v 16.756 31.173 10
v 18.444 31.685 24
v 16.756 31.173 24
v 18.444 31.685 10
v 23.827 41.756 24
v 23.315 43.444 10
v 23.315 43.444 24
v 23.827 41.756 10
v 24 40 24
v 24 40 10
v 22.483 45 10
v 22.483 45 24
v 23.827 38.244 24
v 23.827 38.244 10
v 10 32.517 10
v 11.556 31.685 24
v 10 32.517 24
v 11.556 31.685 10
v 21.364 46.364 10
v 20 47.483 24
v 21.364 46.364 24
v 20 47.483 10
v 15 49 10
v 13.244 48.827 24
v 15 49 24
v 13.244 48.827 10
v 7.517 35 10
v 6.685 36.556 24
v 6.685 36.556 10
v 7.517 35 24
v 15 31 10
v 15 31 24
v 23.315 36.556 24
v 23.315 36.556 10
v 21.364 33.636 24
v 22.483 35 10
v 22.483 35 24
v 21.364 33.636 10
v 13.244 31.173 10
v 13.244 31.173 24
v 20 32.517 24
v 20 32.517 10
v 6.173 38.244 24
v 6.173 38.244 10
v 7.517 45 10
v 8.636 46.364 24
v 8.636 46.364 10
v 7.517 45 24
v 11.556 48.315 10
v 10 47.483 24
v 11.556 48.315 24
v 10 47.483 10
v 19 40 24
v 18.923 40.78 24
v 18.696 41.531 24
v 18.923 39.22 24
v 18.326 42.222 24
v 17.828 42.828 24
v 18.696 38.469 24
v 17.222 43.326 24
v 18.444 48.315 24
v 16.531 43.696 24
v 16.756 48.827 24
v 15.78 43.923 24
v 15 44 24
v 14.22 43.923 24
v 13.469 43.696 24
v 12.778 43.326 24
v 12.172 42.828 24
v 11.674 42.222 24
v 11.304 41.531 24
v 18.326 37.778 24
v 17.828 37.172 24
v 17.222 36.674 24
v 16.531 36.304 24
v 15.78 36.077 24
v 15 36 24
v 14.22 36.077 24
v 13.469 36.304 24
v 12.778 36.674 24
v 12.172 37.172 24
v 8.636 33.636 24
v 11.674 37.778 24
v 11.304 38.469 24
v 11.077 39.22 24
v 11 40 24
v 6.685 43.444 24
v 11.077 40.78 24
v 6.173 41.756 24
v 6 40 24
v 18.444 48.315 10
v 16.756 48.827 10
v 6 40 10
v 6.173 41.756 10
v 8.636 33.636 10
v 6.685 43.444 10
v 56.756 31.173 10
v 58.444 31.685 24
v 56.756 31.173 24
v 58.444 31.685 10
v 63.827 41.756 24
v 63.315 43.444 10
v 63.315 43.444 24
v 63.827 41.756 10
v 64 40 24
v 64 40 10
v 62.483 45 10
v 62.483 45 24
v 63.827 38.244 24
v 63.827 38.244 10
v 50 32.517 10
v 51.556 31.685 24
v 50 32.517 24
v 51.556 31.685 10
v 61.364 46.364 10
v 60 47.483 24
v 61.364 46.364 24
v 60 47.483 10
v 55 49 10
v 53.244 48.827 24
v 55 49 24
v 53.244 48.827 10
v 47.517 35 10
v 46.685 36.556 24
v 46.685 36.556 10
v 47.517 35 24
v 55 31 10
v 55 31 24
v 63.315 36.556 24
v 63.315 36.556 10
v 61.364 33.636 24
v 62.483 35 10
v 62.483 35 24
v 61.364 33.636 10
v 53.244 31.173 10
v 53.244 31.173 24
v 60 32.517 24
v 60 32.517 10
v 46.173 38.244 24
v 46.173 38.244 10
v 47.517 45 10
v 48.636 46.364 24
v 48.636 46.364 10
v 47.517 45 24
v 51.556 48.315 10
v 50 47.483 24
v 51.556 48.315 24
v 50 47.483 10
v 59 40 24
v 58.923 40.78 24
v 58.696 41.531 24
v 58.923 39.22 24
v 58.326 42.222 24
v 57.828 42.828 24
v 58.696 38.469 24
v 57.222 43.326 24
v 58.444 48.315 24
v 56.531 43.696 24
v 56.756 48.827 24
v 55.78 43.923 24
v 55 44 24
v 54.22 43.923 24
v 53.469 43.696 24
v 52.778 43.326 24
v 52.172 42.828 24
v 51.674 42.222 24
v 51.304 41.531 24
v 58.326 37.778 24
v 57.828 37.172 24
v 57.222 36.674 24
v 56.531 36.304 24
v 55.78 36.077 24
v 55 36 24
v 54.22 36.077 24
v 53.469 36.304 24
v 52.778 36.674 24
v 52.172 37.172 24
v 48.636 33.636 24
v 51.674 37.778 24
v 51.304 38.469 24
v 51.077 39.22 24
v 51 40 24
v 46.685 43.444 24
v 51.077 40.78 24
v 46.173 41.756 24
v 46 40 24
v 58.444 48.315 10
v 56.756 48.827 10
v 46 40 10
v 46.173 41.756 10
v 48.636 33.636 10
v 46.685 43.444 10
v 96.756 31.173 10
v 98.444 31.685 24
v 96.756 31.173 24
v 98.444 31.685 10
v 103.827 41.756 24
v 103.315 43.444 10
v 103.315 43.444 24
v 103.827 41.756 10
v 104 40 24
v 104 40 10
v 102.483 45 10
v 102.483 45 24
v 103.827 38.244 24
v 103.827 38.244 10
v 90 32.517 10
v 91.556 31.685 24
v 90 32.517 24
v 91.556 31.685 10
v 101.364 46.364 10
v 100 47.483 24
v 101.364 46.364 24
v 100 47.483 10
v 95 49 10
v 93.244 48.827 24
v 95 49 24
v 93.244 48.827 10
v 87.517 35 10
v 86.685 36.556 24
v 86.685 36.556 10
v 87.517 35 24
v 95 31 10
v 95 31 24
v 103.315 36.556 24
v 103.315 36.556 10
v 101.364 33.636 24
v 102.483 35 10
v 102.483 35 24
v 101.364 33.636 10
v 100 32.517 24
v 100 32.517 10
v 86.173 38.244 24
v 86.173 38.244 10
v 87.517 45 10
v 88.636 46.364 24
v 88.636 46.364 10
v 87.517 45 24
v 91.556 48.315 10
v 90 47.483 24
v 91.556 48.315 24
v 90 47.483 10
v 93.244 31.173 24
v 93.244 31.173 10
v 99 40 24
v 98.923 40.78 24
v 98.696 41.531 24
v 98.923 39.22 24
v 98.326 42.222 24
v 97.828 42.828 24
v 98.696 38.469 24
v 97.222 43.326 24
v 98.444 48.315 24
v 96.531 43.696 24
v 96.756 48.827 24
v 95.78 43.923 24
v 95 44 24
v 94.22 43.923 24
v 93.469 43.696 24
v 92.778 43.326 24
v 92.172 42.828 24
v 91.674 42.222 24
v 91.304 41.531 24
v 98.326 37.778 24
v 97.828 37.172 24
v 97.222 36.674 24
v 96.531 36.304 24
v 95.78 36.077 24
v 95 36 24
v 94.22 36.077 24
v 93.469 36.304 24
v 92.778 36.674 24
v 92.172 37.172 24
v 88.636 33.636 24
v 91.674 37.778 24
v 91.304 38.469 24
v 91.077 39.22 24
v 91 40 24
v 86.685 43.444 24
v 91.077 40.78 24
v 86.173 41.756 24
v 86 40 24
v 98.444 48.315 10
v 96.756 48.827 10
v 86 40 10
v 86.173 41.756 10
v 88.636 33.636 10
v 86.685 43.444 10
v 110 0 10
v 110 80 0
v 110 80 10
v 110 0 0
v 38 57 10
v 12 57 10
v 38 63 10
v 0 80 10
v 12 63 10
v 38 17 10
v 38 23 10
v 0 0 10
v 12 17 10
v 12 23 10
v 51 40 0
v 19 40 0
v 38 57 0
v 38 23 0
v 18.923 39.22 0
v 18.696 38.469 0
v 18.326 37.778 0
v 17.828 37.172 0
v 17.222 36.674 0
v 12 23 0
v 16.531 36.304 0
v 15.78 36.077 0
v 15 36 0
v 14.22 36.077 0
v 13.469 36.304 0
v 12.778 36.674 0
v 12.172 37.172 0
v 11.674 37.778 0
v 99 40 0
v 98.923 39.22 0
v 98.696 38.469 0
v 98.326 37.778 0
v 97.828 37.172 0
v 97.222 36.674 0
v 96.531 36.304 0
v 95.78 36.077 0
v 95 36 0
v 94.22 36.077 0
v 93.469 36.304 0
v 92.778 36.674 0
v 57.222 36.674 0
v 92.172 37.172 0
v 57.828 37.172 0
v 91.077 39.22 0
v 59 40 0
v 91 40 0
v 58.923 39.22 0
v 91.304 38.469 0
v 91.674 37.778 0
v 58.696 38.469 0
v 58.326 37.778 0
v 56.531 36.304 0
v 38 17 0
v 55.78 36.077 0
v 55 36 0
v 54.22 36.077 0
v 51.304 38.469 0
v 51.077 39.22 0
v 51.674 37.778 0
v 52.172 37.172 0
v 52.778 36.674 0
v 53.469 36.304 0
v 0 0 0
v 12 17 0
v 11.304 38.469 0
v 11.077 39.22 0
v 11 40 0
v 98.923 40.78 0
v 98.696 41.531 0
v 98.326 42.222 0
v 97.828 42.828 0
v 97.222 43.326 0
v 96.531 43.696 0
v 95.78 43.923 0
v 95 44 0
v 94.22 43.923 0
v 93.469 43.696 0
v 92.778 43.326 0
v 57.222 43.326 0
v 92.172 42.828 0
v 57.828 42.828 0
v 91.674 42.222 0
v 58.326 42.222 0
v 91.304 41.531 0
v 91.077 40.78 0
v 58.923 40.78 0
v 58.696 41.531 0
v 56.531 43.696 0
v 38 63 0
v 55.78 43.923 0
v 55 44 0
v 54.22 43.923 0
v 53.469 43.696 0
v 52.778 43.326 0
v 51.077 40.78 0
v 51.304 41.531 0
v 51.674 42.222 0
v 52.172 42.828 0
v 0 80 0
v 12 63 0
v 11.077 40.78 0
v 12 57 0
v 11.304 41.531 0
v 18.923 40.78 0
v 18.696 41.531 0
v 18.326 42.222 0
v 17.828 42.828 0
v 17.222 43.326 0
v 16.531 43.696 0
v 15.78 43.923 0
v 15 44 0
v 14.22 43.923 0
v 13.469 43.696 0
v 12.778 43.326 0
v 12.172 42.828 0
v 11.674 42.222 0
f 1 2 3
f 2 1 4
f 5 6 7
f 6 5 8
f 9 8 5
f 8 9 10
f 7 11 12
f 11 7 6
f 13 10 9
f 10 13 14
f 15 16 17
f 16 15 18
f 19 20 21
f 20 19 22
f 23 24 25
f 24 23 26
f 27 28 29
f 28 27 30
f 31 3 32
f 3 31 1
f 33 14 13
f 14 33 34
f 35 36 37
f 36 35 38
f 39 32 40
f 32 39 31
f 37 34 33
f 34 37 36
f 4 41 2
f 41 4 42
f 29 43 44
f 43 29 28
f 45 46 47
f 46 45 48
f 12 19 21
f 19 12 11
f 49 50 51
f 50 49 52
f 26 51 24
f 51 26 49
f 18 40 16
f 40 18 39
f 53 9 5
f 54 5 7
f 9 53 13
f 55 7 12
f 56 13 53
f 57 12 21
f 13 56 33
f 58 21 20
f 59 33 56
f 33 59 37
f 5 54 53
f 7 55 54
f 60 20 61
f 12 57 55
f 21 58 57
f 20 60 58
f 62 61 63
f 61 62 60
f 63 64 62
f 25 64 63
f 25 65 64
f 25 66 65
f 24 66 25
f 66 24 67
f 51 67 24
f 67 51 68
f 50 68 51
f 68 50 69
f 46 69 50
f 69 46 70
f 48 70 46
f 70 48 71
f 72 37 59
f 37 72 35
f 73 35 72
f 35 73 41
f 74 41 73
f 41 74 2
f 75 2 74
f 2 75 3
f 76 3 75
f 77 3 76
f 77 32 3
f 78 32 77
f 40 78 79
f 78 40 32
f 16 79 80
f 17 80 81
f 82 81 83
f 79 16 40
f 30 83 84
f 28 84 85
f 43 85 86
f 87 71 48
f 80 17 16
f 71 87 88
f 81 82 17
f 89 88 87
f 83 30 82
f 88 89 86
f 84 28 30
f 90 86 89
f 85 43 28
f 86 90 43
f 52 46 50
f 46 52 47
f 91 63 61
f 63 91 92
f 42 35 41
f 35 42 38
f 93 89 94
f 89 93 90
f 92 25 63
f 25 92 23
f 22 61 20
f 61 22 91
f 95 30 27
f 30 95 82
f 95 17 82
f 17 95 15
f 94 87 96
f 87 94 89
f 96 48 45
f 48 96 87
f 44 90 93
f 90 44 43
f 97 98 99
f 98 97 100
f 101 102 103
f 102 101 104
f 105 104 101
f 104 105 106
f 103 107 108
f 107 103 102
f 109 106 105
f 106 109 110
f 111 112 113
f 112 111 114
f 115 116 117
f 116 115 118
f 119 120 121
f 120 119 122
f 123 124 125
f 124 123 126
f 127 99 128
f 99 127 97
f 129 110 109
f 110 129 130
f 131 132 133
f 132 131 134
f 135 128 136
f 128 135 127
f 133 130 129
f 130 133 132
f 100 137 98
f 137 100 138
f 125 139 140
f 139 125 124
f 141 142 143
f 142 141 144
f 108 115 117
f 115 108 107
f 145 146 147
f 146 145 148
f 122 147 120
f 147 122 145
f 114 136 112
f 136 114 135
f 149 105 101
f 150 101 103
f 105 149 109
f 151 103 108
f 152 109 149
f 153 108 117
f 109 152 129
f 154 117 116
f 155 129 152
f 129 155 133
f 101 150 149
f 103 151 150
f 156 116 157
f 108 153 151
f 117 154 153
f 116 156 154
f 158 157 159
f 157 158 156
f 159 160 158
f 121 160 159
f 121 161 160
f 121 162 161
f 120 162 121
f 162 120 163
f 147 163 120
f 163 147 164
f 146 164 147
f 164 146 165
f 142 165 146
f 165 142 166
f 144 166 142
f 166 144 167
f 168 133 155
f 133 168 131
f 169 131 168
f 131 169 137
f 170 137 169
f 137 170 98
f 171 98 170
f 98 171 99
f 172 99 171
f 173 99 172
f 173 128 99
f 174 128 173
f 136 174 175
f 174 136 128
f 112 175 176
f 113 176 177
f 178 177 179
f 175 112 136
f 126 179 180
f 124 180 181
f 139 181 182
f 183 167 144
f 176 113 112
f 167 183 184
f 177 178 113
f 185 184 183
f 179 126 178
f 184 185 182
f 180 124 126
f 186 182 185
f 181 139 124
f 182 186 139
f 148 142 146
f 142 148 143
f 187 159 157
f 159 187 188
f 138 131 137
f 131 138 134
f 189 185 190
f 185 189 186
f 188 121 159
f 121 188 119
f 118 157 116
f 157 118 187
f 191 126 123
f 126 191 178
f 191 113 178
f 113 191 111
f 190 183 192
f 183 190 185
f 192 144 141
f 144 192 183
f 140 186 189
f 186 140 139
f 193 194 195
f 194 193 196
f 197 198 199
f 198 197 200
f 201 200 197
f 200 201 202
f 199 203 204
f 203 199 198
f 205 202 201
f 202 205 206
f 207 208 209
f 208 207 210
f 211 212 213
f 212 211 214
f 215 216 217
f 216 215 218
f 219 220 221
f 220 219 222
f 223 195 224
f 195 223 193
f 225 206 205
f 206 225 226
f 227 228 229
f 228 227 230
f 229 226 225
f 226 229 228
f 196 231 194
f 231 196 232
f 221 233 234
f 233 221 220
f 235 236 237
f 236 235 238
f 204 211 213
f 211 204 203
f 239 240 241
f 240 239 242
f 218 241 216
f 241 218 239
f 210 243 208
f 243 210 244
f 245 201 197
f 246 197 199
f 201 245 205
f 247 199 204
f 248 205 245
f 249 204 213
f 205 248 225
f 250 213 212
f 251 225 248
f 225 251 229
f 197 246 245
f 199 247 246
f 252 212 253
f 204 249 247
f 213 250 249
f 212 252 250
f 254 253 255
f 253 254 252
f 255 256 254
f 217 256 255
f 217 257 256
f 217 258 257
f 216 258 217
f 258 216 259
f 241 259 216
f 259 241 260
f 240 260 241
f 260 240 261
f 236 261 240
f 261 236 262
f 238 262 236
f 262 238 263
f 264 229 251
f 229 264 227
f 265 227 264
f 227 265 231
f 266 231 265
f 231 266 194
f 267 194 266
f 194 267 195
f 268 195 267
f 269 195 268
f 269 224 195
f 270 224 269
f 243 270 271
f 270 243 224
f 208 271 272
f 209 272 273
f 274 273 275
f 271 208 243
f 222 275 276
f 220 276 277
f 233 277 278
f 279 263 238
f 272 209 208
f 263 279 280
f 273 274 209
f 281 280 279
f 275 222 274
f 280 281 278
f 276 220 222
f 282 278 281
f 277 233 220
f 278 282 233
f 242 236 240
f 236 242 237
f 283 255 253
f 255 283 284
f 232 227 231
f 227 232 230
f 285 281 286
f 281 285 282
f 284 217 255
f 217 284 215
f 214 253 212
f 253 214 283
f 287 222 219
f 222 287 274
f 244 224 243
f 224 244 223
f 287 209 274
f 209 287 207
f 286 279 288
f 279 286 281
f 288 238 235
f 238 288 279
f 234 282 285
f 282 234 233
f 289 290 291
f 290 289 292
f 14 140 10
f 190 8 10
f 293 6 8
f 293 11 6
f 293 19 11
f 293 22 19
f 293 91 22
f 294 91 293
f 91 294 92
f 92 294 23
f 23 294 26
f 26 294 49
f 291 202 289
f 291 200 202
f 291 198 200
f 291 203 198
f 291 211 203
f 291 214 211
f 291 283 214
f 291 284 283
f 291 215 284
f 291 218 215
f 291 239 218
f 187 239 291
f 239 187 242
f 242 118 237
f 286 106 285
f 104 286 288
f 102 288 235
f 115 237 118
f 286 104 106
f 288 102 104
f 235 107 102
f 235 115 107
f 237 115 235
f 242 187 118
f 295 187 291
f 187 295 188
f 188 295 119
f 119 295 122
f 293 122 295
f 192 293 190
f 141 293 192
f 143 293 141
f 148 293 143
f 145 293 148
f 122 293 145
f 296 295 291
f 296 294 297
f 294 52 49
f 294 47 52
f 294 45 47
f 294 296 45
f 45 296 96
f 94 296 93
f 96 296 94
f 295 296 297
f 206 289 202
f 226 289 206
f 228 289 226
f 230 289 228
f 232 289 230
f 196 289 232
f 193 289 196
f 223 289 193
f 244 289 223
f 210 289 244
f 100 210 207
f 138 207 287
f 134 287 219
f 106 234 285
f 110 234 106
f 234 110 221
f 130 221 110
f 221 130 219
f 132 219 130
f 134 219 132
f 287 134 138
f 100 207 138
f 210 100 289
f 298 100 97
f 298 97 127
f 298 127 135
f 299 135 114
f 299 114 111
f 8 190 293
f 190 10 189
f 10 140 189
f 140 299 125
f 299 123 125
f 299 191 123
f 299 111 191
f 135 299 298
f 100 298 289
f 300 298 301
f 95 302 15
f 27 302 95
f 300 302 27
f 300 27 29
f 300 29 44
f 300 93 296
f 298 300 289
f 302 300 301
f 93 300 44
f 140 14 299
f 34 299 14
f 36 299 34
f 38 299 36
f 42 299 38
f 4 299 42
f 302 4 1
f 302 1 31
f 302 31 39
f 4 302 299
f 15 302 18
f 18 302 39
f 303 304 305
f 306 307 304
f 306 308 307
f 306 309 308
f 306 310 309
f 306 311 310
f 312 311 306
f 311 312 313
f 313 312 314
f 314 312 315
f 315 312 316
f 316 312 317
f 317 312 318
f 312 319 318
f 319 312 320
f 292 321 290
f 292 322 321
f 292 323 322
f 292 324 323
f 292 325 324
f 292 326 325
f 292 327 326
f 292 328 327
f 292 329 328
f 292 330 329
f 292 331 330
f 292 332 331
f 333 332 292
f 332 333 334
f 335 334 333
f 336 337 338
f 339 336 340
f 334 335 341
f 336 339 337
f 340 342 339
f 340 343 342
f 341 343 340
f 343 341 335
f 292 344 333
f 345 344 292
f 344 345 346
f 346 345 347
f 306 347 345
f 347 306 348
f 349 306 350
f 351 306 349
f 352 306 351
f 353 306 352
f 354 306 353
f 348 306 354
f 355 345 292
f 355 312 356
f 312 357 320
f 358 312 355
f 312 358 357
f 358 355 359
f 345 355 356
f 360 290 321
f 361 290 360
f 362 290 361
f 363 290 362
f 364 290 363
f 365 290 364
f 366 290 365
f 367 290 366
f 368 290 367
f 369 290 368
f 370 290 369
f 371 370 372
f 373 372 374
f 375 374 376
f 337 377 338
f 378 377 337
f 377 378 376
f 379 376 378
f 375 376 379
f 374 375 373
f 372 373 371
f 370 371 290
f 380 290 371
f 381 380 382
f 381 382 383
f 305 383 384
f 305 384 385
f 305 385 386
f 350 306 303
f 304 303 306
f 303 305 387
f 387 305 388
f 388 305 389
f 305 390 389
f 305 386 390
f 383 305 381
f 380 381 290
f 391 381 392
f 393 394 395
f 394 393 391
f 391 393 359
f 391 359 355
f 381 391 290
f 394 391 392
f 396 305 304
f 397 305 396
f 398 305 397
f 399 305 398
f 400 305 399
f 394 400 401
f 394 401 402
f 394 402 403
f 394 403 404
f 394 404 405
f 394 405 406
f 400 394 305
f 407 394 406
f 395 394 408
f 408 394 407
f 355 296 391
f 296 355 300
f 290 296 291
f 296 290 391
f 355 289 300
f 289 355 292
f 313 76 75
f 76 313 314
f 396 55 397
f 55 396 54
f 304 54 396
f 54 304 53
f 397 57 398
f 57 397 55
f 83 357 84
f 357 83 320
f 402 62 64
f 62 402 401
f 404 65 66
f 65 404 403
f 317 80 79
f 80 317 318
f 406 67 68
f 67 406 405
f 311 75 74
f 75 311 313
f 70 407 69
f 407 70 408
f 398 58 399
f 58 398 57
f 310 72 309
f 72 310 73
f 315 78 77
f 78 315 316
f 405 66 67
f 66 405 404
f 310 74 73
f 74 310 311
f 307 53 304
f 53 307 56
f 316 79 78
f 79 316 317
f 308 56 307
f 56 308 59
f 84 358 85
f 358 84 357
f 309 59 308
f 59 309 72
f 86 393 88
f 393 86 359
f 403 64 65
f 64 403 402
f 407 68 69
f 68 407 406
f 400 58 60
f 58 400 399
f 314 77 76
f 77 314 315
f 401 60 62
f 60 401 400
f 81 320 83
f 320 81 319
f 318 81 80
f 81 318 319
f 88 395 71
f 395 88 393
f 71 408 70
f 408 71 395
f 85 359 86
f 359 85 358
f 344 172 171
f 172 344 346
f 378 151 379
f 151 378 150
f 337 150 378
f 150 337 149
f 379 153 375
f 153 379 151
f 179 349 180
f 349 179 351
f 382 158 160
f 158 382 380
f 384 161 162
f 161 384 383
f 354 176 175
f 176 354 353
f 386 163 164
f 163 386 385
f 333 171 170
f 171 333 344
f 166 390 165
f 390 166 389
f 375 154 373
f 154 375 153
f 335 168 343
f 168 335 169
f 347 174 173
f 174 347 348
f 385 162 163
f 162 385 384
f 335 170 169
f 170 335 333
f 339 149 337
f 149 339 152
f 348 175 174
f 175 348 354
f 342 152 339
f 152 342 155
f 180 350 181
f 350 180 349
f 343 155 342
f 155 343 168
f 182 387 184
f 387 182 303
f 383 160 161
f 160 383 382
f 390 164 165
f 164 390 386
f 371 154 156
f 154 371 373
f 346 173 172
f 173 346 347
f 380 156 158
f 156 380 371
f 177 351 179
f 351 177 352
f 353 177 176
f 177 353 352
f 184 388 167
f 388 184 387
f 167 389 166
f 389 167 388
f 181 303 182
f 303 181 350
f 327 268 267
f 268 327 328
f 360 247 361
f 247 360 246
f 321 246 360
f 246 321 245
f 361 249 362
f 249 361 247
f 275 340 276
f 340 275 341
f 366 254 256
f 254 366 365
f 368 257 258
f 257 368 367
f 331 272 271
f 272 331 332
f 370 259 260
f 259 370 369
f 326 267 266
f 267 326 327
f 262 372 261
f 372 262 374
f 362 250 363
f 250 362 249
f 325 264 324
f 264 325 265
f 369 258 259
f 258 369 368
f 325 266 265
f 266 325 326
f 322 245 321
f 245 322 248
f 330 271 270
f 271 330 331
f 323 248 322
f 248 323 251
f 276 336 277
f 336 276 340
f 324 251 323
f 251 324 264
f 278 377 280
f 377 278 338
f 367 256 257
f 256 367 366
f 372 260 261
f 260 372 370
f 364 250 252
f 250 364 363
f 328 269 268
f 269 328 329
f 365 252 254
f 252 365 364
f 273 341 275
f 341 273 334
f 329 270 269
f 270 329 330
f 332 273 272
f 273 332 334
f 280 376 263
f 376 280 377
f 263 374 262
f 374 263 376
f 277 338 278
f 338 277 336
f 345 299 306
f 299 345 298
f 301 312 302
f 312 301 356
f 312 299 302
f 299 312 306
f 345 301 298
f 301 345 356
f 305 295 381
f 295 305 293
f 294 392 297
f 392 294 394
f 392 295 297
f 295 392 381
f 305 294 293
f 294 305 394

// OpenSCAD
$fn = 32;

// ----------------------------------------------------------------------
// Drill jig: three_boss_slot jig
// ----------------------------------------------------------------------

// --- parameters (mm) ---
plate_l = 110;            // plate length, X
plate_w = 80;             // plate width, Y
plate_t = 10;             // plate thickness
boss_d = 18;              // guide boss diameter
boss_h = 15;              // boss height above the plate
guide_d = 8;              // guide hole diameter
boss_pitch = 40;          // boss pitch
slot_w = 6;               // clamp slot width
slot_l = 26;              // clamp slot length
slot_x = 12;              // slot start X

n_boss = 3;  // guide bosses
boss_x0 = (plate_l - (n_boss - 1) * boss_pitch) / 2;  // first boss X
boss_top = plate_t - 1 + boss_h;  // boss crown height
total_h = boss_top;  // overall height

difference() {
  union() {
  cube([plate_l, plate_w, plate_t]);
  for (i = [0 : n_boss - 1])
    translate([boss_x0 + i * boss_pitch, plate_w / 2, plate_t - 1])
      cylinder(h = boss_h, d = boss_d);
  }
  for (i = [0 : n_boss - 1])
    translate([boss_x0 + i * boss_pitch, plate_w / 2, -1])
      cylinder(h = plate_t + boss_h, d = guide_d);
  for (cy = [plate_w * 0.25, plate_w * 0.75])
    translate([slot_x, cy - slot_w / 2, -1])
      cube([slot_l, slot_w, plate_t + 2]);
}
